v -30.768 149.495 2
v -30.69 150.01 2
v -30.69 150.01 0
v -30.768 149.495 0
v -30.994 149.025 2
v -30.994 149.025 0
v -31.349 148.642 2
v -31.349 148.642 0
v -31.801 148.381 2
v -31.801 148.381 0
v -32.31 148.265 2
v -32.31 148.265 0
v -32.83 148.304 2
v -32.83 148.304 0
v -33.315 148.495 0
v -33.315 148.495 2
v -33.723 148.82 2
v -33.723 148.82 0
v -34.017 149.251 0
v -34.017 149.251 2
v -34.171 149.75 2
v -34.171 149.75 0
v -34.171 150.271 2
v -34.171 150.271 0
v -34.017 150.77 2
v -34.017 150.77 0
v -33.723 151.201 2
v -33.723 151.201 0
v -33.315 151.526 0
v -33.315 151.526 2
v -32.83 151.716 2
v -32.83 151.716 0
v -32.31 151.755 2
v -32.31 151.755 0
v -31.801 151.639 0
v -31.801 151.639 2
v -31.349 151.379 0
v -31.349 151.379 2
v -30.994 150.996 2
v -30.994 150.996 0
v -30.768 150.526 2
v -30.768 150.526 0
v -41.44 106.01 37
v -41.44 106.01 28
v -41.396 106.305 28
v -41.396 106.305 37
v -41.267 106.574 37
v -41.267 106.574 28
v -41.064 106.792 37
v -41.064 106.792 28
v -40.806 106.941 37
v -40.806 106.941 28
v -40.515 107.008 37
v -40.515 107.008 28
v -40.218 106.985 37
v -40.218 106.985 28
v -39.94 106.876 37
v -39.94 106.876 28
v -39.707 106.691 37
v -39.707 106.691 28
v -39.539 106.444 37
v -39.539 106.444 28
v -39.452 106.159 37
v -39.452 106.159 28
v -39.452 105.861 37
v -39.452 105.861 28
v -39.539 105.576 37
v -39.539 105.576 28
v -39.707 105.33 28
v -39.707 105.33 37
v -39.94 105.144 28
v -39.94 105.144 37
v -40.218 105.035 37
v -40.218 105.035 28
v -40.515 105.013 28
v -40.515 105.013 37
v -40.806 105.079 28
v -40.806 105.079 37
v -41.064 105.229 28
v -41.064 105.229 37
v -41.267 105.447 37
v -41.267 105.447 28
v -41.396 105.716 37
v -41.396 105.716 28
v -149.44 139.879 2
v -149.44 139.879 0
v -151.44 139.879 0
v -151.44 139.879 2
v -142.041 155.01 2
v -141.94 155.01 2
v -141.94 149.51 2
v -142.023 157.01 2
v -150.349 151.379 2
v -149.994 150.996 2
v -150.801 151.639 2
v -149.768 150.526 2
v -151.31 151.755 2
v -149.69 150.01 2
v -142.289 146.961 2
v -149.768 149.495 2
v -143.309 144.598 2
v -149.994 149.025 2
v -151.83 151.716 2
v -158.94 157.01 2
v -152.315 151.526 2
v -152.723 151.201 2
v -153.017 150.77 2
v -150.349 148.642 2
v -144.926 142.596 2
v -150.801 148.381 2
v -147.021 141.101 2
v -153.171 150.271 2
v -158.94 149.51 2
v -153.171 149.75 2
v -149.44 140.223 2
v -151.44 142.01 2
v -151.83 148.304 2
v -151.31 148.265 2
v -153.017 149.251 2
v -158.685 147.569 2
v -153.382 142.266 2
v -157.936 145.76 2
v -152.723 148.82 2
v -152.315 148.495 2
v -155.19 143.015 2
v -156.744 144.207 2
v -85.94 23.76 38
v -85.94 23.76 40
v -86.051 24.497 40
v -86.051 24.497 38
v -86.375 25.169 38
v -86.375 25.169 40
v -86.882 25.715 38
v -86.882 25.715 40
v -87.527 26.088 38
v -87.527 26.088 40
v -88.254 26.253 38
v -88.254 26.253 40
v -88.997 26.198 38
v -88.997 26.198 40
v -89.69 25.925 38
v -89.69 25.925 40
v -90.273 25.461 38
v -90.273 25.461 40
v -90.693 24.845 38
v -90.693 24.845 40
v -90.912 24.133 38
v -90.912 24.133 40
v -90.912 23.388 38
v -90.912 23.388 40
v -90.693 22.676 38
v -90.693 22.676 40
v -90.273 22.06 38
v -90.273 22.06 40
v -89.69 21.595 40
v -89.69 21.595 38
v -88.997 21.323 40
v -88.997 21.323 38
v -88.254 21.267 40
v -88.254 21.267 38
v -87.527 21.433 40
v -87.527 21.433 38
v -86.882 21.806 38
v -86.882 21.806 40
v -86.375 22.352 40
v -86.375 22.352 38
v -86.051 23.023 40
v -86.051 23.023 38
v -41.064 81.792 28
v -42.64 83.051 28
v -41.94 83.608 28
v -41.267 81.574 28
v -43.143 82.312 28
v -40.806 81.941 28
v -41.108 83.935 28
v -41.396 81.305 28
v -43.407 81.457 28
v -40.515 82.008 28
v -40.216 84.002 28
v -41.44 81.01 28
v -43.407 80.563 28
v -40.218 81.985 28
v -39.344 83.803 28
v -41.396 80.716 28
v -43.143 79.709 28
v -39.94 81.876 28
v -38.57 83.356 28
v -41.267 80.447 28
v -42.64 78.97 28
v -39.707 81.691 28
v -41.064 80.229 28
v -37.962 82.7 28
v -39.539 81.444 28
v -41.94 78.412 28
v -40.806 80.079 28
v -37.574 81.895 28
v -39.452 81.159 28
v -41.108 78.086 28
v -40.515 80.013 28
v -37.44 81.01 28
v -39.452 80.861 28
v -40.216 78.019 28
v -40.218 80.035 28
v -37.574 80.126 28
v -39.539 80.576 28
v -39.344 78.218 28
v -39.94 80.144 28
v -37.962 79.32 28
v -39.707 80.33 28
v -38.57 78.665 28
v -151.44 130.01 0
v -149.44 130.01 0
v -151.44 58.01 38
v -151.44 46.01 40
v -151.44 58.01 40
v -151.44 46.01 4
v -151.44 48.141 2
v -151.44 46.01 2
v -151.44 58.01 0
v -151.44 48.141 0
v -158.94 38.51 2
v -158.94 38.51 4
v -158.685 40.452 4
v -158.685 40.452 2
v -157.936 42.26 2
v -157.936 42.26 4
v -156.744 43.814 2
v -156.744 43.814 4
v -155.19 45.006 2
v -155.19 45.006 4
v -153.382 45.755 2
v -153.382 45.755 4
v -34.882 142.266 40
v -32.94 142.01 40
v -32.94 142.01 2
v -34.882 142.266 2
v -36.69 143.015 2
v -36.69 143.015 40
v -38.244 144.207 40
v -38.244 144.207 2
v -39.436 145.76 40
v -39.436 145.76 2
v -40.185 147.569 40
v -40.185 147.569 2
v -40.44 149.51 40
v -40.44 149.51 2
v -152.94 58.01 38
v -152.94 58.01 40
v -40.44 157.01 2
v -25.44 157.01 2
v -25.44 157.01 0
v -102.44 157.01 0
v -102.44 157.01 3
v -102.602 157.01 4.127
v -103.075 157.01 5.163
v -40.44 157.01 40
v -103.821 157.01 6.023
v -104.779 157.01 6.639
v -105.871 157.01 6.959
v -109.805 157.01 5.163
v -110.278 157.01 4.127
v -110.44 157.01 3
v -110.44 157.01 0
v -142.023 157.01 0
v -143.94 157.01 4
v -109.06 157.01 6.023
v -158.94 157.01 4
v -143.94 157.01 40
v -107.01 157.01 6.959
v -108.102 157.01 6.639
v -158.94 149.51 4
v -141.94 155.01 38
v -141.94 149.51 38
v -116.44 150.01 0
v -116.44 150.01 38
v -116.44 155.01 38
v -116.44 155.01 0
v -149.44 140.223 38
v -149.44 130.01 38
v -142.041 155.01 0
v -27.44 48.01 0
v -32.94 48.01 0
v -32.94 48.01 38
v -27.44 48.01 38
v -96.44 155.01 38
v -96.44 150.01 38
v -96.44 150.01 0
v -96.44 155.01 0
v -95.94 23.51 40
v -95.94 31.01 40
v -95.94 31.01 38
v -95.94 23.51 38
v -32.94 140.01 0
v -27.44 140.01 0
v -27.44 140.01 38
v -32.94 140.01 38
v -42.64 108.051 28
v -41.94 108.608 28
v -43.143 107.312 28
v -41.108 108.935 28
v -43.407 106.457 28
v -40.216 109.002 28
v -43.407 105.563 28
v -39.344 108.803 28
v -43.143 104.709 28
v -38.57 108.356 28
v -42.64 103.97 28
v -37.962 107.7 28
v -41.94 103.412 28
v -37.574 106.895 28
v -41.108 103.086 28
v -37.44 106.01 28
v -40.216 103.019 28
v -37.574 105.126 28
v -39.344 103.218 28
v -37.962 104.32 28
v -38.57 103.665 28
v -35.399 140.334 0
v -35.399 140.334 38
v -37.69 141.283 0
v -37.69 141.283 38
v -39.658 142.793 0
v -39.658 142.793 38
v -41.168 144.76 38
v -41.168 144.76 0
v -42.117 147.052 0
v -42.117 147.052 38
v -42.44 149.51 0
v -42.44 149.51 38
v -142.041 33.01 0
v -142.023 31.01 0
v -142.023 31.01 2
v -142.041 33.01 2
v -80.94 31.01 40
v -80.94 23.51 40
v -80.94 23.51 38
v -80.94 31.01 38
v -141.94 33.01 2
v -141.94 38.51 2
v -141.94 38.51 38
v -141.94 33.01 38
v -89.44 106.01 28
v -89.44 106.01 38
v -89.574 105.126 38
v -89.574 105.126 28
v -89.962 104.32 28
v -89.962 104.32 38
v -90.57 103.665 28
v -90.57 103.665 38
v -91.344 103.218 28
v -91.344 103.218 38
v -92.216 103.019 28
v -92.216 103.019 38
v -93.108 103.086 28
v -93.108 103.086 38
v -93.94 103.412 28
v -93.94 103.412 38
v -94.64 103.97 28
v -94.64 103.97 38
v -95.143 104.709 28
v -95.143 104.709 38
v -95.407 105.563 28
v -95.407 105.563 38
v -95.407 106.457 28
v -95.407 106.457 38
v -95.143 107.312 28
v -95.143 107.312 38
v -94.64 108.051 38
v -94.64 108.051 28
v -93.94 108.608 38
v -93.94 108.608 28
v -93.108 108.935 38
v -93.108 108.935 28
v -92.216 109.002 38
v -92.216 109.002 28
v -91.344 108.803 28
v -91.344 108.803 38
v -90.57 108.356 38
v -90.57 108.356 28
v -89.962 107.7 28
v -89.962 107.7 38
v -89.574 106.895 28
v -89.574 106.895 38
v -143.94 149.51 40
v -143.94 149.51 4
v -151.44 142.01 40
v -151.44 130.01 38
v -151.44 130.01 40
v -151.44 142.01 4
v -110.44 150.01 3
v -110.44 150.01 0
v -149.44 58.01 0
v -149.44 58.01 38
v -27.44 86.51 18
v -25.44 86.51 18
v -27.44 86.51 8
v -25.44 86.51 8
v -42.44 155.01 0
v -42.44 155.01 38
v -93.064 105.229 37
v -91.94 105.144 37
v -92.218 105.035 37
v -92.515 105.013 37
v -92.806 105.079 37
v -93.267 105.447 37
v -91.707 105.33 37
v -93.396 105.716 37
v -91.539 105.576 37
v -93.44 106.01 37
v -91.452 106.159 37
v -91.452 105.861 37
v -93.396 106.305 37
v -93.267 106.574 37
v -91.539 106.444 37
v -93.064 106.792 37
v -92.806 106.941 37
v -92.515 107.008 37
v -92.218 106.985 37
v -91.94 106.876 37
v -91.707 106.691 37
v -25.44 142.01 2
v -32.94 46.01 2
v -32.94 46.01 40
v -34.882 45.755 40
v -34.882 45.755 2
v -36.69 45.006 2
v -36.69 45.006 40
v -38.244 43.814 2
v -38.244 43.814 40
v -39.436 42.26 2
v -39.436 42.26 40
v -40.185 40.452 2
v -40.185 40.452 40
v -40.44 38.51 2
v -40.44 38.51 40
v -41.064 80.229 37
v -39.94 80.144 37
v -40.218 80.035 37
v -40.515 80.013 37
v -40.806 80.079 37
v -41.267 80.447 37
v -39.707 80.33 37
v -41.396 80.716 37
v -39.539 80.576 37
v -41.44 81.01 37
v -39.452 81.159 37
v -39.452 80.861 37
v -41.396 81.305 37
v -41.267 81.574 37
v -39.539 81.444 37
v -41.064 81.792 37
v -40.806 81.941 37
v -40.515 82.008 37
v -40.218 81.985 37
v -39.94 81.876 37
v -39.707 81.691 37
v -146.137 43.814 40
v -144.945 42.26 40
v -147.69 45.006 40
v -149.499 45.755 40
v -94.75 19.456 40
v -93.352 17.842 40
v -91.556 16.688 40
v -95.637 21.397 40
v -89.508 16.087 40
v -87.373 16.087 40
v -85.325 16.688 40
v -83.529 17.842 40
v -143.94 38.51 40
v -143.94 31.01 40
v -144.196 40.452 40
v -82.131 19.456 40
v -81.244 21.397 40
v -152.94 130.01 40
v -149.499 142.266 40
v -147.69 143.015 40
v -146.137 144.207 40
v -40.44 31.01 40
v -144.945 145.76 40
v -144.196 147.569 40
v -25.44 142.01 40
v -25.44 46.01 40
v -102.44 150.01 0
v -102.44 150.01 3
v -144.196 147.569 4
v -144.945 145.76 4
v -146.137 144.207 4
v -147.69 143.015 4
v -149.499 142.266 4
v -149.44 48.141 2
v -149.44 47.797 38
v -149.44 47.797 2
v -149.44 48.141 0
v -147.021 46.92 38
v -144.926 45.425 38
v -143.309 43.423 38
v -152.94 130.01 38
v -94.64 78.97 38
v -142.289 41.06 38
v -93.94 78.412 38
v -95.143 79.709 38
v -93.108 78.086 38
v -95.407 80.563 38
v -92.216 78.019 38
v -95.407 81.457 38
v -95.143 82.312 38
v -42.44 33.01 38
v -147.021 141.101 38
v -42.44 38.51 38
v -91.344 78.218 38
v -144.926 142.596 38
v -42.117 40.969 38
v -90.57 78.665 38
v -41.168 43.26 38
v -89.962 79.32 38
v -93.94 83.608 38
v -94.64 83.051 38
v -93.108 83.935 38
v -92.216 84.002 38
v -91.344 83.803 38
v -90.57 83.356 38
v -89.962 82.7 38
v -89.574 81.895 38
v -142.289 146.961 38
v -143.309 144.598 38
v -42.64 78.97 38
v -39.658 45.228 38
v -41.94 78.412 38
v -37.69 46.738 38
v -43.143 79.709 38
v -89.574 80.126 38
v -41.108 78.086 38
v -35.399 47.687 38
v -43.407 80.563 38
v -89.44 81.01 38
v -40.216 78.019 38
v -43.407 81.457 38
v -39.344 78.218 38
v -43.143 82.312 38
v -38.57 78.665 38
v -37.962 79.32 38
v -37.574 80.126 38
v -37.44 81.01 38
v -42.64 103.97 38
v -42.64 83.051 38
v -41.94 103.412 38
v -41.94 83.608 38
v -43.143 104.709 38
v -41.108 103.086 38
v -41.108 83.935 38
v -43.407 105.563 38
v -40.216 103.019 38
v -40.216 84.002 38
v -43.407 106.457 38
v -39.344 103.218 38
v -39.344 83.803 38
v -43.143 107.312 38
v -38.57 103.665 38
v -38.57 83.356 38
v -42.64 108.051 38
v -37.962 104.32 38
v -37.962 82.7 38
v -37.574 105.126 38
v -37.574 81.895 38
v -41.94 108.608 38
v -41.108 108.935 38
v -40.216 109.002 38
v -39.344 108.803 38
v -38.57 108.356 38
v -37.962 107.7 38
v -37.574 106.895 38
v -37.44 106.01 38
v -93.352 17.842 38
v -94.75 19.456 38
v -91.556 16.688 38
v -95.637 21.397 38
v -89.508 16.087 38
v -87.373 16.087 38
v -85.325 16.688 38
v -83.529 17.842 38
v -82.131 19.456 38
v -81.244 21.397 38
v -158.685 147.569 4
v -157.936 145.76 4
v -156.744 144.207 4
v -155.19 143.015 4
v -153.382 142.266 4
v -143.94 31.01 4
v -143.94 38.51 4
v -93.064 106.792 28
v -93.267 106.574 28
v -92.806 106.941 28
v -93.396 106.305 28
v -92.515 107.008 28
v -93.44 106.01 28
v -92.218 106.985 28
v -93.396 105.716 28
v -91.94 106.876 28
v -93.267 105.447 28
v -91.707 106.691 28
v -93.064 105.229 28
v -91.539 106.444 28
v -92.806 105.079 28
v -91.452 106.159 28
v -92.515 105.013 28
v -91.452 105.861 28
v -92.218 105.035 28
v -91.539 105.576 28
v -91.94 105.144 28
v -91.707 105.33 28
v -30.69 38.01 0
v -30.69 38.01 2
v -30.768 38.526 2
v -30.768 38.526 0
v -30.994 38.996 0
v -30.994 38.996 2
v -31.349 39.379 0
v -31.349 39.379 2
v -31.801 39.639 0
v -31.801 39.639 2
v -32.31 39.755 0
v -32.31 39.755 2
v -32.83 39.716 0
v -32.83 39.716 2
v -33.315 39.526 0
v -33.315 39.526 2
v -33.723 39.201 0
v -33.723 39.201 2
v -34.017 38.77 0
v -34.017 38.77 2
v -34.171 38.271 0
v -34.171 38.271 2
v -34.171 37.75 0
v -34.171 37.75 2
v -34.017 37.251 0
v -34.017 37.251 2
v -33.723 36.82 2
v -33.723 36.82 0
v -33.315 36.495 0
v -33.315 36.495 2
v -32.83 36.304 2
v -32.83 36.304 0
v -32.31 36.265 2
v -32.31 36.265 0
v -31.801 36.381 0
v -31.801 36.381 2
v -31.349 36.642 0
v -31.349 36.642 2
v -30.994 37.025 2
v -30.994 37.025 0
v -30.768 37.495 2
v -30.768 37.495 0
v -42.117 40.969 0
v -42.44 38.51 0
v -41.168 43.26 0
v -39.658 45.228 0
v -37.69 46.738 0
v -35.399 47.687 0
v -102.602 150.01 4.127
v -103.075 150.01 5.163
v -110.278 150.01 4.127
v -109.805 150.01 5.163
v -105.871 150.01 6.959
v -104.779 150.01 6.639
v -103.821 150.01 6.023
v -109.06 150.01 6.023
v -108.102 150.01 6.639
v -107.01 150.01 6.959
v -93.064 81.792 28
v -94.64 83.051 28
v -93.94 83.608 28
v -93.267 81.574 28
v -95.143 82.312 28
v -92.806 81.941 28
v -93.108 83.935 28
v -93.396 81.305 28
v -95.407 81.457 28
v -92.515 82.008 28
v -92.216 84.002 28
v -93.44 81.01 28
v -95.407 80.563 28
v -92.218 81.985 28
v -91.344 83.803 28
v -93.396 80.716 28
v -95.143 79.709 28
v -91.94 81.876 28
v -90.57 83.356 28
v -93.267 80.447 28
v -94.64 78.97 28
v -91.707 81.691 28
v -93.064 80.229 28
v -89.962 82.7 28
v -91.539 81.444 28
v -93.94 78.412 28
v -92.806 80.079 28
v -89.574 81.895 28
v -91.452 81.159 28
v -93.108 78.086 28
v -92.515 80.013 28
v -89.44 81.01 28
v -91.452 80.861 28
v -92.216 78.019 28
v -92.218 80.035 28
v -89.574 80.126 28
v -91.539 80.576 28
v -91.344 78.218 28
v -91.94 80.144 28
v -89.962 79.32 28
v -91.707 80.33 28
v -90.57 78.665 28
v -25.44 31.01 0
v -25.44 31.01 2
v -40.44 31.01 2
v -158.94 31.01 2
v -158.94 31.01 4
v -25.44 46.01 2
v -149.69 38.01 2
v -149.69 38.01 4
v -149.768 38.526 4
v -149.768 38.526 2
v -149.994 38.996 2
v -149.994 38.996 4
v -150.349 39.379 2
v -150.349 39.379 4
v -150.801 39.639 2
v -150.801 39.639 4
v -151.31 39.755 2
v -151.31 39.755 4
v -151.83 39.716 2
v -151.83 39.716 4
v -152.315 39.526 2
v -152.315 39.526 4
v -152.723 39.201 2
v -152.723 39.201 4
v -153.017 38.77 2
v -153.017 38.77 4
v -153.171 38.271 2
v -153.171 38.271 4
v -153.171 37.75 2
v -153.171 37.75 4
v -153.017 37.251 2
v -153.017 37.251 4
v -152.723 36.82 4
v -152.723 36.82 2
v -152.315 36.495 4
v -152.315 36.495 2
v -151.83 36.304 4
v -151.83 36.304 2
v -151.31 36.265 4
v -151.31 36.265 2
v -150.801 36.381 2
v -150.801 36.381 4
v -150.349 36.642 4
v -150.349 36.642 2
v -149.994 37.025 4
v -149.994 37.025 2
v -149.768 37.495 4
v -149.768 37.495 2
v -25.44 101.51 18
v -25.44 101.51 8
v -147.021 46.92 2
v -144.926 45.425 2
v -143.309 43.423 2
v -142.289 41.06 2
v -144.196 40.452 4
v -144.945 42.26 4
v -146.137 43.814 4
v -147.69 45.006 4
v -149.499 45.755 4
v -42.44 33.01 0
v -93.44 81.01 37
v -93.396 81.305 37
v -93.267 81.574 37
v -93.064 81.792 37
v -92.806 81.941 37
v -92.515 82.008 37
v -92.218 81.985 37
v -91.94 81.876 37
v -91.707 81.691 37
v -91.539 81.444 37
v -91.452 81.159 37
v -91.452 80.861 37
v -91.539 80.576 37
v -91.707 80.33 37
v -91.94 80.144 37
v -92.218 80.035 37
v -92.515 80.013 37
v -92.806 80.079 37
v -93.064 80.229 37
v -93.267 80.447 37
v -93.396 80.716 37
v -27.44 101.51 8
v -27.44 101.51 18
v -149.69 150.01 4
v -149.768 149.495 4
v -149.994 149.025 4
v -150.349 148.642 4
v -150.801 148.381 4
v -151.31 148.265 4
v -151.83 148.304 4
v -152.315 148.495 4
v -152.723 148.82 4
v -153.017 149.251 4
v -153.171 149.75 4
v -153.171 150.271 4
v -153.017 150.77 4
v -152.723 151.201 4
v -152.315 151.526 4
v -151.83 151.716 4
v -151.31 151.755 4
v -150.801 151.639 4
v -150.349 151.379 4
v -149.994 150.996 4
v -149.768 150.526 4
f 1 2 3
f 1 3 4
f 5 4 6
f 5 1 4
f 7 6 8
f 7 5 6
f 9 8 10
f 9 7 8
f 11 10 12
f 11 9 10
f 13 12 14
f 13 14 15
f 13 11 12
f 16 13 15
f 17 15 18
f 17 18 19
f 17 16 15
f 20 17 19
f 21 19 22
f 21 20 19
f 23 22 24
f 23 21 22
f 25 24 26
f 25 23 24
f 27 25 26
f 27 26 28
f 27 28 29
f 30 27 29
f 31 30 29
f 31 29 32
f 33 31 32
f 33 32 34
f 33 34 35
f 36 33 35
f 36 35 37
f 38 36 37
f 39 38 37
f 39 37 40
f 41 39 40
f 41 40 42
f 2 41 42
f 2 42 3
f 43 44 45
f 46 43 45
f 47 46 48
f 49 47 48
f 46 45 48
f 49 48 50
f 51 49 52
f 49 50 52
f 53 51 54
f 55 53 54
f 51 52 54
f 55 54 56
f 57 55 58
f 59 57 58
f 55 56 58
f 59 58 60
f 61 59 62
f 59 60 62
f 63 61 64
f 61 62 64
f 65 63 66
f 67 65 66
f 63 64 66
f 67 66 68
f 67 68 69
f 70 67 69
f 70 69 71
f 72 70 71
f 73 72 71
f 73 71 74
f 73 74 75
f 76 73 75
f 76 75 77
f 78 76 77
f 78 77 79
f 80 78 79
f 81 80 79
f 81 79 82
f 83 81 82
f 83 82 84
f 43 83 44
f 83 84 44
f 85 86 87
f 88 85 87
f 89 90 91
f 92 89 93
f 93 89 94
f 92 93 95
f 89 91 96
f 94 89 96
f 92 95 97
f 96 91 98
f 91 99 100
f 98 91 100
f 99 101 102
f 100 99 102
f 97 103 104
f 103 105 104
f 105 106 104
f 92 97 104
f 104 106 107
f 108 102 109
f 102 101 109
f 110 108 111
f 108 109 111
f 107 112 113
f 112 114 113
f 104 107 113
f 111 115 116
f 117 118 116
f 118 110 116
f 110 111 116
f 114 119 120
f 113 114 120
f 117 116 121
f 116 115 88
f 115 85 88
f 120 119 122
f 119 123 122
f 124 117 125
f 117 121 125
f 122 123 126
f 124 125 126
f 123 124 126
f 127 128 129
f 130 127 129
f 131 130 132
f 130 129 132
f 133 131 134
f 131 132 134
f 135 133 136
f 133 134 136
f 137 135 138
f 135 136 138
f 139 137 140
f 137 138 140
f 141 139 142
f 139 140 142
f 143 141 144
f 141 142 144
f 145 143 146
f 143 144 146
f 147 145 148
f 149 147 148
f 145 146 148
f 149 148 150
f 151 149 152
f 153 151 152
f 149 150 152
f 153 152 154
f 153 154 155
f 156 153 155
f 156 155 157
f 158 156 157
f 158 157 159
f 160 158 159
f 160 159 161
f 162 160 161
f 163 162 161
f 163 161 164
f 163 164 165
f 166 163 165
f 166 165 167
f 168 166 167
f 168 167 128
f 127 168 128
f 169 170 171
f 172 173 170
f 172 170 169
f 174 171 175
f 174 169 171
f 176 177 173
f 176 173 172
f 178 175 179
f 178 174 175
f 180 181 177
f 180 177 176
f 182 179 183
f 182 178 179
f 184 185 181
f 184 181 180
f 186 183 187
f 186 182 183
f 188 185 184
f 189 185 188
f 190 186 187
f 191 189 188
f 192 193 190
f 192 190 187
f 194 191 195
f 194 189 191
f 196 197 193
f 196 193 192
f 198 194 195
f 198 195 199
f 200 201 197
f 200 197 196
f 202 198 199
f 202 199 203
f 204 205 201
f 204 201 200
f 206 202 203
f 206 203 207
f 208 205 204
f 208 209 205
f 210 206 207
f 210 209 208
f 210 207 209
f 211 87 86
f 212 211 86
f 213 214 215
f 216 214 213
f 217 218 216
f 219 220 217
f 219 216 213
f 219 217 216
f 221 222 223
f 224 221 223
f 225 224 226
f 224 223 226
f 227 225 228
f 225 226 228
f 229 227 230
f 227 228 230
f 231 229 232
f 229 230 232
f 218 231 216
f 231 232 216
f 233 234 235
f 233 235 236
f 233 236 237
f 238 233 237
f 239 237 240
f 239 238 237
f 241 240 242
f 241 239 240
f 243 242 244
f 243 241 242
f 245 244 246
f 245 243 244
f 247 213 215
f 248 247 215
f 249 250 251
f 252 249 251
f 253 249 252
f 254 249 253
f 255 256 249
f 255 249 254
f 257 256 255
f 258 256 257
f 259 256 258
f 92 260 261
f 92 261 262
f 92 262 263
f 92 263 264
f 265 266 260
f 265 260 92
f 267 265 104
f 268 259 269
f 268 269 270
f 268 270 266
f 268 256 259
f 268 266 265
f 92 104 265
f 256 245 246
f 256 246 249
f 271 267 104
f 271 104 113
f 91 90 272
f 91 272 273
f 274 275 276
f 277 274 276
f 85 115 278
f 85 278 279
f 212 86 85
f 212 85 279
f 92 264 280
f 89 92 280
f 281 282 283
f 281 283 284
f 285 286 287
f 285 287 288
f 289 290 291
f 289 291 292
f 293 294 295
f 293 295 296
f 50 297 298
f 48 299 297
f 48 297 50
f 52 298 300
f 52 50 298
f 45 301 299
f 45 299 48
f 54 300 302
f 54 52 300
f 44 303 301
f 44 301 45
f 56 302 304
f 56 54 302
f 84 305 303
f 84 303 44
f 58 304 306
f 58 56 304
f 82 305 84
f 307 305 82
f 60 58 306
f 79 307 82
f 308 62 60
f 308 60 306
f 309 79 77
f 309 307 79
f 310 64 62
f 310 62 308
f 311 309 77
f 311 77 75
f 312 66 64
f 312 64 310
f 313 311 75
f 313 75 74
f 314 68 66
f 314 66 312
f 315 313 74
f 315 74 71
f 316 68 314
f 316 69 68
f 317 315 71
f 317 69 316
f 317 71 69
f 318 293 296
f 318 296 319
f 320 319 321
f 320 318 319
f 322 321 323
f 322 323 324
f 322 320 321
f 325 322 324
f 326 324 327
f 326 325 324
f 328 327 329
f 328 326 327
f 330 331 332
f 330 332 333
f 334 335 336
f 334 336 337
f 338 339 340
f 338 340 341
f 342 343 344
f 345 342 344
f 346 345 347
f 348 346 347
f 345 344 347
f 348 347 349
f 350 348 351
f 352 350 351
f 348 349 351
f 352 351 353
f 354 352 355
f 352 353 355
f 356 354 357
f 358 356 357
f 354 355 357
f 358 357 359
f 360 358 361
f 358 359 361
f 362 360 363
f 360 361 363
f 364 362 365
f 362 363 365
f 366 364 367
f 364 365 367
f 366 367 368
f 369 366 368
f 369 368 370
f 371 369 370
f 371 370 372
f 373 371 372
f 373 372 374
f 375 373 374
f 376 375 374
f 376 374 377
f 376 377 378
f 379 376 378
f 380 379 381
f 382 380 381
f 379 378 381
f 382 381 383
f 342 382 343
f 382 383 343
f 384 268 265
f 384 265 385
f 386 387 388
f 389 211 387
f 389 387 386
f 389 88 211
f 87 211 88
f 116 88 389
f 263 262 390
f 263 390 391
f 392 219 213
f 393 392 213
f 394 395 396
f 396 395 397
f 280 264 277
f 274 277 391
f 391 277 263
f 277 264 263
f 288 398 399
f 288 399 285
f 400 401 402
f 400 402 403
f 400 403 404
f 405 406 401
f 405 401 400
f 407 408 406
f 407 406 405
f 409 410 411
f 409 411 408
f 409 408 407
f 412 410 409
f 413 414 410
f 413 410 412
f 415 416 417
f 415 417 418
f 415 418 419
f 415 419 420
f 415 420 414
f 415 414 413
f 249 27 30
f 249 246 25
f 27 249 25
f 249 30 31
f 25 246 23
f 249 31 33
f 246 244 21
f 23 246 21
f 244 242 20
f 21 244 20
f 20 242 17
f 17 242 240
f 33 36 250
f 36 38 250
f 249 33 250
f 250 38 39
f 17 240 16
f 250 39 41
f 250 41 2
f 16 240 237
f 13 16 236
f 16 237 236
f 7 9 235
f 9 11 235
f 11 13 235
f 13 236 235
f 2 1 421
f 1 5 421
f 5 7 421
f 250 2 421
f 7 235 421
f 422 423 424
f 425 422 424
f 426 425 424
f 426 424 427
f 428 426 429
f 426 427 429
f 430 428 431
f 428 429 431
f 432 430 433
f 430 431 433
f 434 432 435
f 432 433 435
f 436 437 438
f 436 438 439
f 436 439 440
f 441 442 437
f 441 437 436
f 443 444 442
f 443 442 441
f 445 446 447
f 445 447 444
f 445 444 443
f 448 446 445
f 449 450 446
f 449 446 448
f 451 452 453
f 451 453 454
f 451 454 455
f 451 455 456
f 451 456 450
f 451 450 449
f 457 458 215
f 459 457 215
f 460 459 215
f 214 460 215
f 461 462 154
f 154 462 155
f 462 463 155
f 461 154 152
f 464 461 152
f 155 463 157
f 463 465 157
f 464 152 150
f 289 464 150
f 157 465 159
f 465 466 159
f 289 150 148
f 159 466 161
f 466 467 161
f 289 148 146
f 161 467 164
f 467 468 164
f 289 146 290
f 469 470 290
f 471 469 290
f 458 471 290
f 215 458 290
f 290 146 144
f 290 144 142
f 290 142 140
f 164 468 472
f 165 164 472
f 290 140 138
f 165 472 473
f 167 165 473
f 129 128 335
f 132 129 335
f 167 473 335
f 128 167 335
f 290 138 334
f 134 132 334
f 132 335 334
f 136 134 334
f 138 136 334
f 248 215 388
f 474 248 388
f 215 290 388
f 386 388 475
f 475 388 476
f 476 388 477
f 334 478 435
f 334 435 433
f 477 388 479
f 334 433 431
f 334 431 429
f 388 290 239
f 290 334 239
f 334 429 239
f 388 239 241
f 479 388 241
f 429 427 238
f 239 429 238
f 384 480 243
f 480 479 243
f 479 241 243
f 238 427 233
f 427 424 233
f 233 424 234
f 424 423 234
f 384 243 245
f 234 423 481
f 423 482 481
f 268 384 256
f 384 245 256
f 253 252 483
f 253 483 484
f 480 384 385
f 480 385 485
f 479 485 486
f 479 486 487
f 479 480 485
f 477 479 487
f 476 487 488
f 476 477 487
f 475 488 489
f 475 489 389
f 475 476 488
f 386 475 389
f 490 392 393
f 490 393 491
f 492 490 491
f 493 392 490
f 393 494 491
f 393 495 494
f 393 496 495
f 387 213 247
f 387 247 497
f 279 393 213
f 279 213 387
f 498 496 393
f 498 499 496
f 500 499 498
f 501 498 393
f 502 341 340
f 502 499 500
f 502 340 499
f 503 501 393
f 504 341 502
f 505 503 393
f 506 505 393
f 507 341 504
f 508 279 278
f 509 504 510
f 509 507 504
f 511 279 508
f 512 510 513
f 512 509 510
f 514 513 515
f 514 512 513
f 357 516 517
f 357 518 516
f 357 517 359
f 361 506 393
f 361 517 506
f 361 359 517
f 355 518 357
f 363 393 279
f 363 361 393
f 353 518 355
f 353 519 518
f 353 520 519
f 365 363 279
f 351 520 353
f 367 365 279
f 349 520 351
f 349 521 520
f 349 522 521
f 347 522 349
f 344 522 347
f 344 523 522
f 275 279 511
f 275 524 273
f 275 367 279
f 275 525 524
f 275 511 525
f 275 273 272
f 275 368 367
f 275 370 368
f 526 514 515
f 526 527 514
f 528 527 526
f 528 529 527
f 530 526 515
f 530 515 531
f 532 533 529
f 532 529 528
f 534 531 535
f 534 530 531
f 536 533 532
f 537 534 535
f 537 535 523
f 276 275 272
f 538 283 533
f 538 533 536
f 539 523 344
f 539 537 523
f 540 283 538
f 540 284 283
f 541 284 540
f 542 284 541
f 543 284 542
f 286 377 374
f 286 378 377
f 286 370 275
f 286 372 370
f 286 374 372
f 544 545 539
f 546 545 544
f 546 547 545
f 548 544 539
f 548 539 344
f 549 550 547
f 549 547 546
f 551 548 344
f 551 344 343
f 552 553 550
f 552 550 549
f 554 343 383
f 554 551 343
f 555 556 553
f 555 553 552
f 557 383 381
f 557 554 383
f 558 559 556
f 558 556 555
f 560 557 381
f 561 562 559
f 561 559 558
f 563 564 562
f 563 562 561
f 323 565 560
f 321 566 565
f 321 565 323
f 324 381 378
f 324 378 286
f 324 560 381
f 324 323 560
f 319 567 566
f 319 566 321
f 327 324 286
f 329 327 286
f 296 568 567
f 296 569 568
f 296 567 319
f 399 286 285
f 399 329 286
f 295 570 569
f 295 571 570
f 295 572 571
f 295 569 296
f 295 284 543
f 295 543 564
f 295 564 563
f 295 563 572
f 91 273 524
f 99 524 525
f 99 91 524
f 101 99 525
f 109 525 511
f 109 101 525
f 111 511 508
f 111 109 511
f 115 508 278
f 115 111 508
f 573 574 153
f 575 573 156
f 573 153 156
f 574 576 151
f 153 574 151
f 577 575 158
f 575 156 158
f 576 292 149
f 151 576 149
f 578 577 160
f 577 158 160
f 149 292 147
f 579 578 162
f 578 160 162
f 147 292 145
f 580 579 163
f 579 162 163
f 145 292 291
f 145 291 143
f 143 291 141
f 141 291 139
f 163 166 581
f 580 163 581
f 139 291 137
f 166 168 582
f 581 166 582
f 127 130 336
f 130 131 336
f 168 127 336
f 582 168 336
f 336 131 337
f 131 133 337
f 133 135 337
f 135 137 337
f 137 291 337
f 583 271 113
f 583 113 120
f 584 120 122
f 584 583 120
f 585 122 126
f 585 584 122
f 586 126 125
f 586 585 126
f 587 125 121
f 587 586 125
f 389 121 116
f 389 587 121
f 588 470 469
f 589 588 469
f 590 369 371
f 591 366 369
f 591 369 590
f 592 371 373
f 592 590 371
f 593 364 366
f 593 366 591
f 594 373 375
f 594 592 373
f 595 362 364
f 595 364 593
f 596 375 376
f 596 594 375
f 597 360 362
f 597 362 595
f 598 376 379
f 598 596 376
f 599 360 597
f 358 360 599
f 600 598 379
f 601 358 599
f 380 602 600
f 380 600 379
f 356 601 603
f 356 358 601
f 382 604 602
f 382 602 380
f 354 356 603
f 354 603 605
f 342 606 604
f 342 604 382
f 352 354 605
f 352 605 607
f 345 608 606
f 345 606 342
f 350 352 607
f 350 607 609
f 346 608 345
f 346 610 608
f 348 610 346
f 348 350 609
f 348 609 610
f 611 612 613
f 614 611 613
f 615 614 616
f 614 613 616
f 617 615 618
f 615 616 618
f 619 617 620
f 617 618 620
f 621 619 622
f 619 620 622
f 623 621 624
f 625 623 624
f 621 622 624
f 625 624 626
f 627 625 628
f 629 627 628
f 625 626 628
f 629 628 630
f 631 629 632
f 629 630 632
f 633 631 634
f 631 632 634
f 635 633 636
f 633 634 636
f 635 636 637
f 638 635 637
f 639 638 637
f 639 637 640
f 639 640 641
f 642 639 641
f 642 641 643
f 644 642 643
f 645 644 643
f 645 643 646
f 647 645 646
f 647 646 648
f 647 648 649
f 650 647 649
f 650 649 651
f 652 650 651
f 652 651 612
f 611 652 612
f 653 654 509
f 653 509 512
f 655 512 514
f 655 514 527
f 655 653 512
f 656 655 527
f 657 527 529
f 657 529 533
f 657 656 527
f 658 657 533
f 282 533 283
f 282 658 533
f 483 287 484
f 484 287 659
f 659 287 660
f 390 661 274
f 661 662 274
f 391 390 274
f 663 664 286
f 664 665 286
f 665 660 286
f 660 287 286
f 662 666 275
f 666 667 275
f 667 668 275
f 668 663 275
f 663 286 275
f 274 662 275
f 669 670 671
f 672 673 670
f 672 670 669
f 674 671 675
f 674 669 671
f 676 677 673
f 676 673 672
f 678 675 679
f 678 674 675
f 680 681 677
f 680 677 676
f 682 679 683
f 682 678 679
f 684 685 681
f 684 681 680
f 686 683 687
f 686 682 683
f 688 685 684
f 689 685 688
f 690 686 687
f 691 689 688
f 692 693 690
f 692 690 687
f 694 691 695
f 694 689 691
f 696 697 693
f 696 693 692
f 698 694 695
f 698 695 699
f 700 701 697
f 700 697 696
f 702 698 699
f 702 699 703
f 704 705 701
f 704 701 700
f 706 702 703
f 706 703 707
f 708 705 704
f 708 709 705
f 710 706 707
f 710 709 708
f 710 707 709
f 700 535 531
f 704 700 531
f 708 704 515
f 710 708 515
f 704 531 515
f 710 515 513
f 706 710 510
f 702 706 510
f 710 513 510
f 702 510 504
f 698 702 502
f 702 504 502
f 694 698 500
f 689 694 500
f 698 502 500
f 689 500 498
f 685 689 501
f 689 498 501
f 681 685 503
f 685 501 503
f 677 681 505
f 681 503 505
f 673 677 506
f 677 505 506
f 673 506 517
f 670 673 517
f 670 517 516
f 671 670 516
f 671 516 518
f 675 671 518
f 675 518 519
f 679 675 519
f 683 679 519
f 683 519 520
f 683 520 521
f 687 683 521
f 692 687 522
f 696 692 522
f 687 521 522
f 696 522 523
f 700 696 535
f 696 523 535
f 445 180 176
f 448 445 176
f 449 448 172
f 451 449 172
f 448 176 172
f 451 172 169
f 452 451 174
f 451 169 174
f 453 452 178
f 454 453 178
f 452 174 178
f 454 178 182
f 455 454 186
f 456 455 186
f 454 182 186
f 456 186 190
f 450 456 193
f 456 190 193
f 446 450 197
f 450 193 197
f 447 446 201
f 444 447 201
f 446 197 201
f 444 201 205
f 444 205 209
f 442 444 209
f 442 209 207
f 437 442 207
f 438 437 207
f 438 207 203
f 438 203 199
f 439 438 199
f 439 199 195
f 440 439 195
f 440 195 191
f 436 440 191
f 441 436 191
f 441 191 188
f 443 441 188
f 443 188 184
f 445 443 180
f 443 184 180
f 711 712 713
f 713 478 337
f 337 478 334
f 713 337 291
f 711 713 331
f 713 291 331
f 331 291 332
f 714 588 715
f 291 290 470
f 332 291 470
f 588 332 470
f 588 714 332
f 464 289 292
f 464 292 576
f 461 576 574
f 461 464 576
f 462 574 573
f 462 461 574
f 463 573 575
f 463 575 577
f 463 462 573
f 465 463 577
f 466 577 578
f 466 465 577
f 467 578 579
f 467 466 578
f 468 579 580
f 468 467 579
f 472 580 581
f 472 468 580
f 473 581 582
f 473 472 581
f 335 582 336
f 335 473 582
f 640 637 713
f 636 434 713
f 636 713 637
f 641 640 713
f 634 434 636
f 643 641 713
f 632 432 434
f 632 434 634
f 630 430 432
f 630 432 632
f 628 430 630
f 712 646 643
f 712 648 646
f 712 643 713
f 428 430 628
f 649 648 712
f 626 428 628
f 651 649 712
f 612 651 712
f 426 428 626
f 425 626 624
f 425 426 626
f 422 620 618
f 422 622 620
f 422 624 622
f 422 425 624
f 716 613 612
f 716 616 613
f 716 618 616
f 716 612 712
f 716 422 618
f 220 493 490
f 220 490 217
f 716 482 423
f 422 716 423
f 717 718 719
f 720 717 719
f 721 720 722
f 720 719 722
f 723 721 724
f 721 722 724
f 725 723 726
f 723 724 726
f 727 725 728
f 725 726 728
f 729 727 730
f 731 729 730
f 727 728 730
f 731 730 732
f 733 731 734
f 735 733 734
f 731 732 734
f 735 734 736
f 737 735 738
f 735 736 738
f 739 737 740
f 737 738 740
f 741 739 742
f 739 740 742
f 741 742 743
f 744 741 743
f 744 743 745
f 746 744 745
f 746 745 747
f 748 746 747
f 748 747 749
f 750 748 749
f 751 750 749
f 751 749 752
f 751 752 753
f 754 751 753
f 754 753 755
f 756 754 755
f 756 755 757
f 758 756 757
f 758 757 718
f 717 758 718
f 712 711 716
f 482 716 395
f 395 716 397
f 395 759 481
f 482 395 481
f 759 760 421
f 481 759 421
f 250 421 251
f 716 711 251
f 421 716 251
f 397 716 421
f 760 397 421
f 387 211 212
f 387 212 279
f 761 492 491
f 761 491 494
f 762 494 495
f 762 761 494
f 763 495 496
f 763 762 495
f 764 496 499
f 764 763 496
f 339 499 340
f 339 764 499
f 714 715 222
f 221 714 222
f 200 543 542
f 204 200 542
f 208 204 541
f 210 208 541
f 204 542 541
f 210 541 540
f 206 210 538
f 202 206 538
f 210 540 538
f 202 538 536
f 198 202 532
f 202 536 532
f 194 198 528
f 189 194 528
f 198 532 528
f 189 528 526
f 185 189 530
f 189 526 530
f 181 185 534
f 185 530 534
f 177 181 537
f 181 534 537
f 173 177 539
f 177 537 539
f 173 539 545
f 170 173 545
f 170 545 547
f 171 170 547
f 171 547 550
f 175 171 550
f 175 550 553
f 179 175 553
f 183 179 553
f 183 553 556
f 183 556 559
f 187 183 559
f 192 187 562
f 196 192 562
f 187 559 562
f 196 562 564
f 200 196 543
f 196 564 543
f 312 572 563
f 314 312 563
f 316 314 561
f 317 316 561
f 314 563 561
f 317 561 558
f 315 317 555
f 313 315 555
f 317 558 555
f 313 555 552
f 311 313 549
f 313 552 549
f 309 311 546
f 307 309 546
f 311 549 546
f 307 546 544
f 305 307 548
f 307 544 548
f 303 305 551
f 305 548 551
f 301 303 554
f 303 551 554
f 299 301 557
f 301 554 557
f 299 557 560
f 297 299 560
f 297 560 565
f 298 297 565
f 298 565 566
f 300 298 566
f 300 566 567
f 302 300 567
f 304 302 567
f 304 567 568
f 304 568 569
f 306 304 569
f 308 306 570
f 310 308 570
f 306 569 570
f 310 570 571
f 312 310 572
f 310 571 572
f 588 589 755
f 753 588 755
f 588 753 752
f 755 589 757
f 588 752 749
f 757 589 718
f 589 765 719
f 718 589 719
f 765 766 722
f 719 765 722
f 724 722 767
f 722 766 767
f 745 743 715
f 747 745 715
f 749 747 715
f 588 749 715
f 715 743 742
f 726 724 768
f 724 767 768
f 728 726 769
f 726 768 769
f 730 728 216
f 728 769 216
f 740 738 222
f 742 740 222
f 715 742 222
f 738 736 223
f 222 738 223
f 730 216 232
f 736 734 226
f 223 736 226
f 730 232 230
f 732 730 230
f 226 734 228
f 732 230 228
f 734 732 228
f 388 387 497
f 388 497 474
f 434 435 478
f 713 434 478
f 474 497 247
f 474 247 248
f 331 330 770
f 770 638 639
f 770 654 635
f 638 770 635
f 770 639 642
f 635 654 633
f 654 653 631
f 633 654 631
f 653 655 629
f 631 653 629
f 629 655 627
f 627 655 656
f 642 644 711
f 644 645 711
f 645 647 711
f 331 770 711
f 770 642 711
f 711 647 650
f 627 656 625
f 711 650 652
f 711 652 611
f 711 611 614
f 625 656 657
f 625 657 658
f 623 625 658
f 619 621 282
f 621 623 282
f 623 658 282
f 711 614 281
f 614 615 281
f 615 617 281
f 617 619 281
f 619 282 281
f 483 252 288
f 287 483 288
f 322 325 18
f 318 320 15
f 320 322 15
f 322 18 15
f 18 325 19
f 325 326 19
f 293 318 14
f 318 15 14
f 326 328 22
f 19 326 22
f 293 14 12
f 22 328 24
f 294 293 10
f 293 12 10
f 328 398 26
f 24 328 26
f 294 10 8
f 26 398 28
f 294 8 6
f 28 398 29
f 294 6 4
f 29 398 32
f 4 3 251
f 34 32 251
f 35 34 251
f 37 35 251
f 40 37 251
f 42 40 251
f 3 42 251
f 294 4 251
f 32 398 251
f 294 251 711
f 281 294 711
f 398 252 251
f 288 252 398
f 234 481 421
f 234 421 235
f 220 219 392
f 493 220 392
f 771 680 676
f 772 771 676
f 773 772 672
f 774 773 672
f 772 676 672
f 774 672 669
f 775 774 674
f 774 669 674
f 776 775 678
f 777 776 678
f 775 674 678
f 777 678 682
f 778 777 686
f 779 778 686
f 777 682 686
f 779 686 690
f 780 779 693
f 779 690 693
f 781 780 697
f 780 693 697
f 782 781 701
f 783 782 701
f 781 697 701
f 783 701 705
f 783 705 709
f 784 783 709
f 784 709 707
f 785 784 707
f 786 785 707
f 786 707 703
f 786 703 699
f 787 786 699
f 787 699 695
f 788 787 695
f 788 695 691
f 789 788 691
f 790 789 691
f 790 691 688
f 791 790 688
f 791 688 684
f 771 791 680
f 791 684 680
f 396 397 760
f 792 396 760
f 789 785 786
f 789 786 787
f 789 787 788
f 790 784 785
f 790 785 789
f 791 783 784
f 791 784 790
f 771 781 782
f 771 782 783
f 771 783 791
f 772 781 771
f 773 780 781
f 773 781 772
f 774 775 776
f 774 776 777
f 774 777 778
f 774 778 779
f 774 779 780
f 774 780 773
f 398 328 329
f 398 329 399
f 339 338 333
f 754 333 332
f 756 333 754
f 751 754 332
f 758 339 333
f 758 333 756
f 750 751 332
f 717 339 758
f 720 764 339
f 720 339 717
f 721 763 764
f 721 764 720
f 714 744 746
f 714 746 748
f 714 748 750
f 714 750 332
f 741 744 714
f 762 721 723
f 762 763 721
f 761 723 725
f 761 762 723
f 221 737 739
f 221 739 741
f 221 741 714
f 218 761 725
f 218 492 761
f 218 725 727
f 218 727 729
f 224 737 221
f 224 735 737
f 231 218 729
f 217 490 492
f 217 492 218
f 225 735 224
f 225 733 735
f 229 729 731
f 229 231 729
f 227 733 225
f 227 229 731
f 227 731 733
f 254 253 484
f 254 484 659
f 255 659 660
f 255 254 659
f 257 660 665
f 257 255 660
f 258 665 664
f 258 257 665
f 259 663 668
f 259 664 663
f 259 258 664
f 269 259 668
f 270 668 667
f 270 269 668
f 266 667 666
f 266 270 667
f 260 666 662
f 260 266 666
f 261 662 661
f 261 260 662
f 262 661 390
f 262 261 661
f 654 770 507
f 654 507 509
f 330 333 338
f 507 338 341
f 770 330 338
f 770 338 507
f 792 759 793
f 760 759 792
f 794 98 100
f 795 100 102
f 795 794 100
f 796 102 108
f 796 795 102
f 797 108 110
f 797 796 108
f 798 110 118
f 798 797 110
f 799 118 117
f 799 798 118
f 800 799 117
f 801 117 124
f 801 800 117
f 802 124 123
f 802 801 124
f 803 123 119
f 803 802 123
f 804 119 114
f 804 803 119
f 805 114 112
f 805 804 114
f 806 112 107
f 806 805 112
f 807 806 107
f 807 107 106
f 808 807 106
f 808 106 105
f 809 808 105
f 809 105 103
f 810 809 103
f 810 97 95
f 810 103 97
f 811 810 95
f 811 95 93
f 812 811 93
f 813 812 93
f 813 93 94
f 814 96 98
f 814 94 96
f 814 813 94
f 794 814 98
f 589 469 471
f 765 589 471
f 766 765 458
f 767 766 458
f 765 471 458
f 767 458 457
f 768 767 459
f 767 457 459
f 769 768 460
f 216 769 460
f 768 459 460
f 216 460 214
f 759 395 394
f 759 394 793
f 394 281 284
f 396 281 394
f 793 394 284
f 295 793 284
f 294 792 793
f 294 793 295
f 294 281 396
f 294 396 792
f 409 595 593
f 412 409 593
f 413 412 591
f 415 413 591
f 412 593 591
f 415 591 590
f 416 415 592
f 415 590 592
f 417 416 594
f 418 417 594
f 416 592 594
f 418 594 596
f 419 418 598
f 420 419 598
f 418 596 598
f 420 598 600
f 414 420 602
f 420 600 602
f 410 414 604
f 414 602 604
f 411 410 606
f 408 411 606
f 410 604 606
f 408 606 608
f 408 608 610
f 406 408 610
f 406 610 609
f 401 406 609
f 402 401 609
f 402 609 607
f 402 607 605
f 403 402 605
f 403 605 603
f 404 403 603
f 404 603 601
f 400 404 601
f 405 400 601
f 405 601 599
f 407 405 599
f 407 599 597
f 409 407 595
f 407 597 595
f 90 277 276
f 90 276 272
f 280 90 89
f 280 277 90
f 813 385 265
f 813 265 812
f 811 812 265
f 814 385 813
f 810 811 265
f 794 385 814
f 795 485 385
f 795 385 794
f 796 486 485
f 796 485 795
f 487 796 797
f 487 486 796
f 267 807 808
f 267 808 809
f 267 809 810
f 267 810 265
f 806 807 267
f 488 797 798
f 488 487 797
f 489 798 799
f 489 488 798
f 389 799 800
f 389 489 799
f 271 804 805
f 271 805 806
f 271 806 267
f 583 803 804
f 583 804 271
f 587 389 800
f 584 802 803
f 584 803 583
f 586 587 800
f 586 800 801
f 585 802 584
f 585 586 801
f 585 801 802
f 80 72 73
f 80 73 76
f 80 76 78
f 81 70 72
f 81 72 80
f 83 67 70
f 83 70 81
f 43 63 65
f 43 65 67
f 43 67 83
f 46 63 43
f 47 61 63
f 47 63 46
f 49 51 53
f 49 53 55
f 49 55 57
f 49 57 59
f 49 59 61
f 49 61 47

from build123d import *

# Parameters (mm, degrees)
ESQUISSE1_W                          = 126
ESQUISSE1_H                          = 126
BOSS_EXTRU_1_DEPTH                   = 40
ENL_V_MAT_EXTRU_1_DEPTH              = 38
ENL_V_MAT_EXTRU_2_REACH              = 223.428
ESQUISSE4_R                          = 1.75
ENL_V_MAT_EXTRU_5_DEPTH              = 36
COQUE1_DEPTH                         = 38
COQUE1_2_DEPTH                       = 2
BOSS_EXTRU_3_DEPTH                   = 2
ENL_V_MAT_EXTRU_6_REACH              = 228.297
ESQUISSE13_R                         = 1.75
ENL_V_MAT_EXTRU_14_DEPTH             = 2
ESQUISSE16_W                         = 40
ESQUISSE16_H                         = 72
ENL_V_MAT_EXTRU_9_DEPTH              = 2
BOSS_EXTRU_5_DEPTH                   = 2
ENL_V_MAT_EXTRU_11_REACH             = 228.968
ESQUISSE21_R                         = 2.5
ESQUISSE23_R                         = 3
BOSS_EXTRU_7_DEPTH                   = 10
ESQUISSE24_R                         = 1
ENL_V_MAT_EXTRU_12_DEPTH             = 9
R_P_TITION_LIN_AIRE1_COUNT           = 2
R_P_TITION_LIN_AIRE1_PITCH           = 25
R_P_TITION_LIN_AIRE2_COUNT           = 2
R_P_TITION_LIN_AIRE2_PITCH           = 52
R_P_TITION_LIN_AIRE2_COPY_1_SKETCH_R = 3
R_P_TITION_LIN_AIRE2_COPY_1_DEPTH    = 10
R_P_TITION_LIN_AIRE2_COPY_2_SKETCH_R = 1
R_P_TITION_LIN_AIRE2_COPY_2_DEPTH    = 9
ENL_V_MAT_EXTRU_13_REACH             = 211.939
ESQUISSE25_W                         = 10
ESQUISSE25_H                         = 15
ESQUISSE28_W                         = 2
ESQUISSE28_H                         = 72
BOSS_EXTRU_8_DEPTH                   = 3.5
ESQUISSE30_W                         = 20
ESQUISSE30_H                         = 5
BOSS_EXTRU_9_DEPTH                   = 38
ENL_V_MAT_EXTRU_15_REACH             = 218.201


# Read off the part's stored shape, not the designer's step: Coque1
with BuildPart() as part:
    # Esquisse1 → Boss.-Extru.1 (new body)
    with BuildSketch(Plane.XY):
        with Locations((-88.440384558, 94.010362694)):
            Rectangle(ESQUISSE1_W, ESQUISSE1_H)
    extrude(amount=BOSS_EXTRU_1_DEPTH)

    # Esquisse2 → Enlèv. mat.-Extru.1 (cut)
    with BuildSketch(Plane.XY.offset(40)):
        with BuildLine():
            Line((-40.440384558, 31.010362694), (-25.440384558, 31.010362694))
            Line((-25.440384558, 31.010362694), (-25.440384558, 46.010362694))
            Line((-25.440384558, 46.010362694), (-32.940384558, 46.010362694))
            ThreePointArc((-32.940384558, 46.010362694), (-38.243685417, 43.813663553), (-40.440384558, 38.510362694))
            Line((-40.440384558, 38.510362694), (-40.440384558, 31.010362694))
        make_face()
    enl_v_mat_extru_1 = extrude(amount=-ENL_V_MAT_EXTRU_1_DEPTH, mode=Mode.SUBTRACT)

    # Esquisse4 → Enlèv. mat.-Extru.2 (cut, up to next)
    with BuildSketch(Plane.XY.offset(2), mode=Mode.PRIVATE) as enl_v_mat_extru_2_sk1:
        with Locations((-32.440384558, 38.010362694)):
            Circle(ESQUISSE4_R)
    enl_v_mat_extru_2_tool1 = extrude(enl_v_mat_extru_2_sk1.sketch, amount=-ENL_V_MAT_EXTRU_2_REACH, mode=Mode.PRIVATE) & part.part
    enl_v_mat_extru_2 = enl_v_mat_extru_2_tool1.solids().sort_by_distance((-32.440385, 38.010363, 2))[0]
    add(enl_v_mat_extru_2, mode=Mode.SUBTRACT)

    # Symétrie1: Enlèv. mat.-Extru.1, Enlèv. mat.-Extru.2 across plane
    add(enl_v_mat_extru_1.mirror(Plane(origin=(0, 94.010362694, 0), x_dir=(0, 0, 1), z_dir=(0, -1, 0))), mode=Mode.SUBTRACT)
    add(enl_v_mat_extru_2.mirror(Plane(origin=(0, 94.010362694, 0), x_dir=(0, 0, 1), z_dir=(0, -1, 0))), mode=Mode.SUBTRACT)

    # Esquisse10 → Enlèv. mat.-Extru.5 (cut)
    with BuildSketch(Plane.XY.offset(40)):
        with BuildLine():
            Line((-151.440384558, 46.010362694), (-151.440384558, 31.010362694))
            Line((-151.440384558, 31.010362694), (-143.940384558, 31.010362694))
            Line((-143.940384558, 31.010362694), (-143.940384558, 38.510362694))
            ThreePointArc((-143.940384558, 38.510362694), (-146.137083699, 43.813663553), (-151.440384558, 46.010362694))
        make_face()
    enl_v_mat_extru_5 = extrude(amount=-ENL_V_MAT_EXTRU_5_DEPTH, mode=Mode.SUBTRACT)

    # Symétrie3: Enlèv. mat.-Extru.5 across plane
    add(enl_v_mat_extru_5.mirror(Plane(origin=(0, 94.010362694, 0), x_dir=(0, 0, 1), z_dir=(0, -1, 0))), mode=Mode.SUBTRACT)

    # Coque1 outline → Coque1 (cut)
    with BuildSketch(Plane.XY):
        with BuildLine():
            Line((-42.440384558, 155.010362694), (-141.940384558, 155.010362694))
            Line((-141.940384558, 155.010362694), (-141.940384558, 149.510362694))
            ThreePointArc((-141.940384558, 149.510362694), (-144.049511808, 143.541694501), (-149.440384558, 140.223274884))
            Line((-149.440384558, 140.223274884), (-149.440384558, 47.797450505))
            ThreePointArc((-149.440384558, 47.797450505), (-144.049511808, 44.479030887), (-141.940384558, 38.510362694))
            Line((-141.940384558, 38.510362694), (-141.940384558, 33.010362694))
            Line((-141.940384558, 33.010362694), (-42.440384558, 33.010362694))
            Line((-42.440384558, 33.010362694), (-42.440384558, 38.510362694))
            ThreePointArc((-42.440384558, 38.510362694), (-39.657898979, 45.227877116), (-32.940384558, 48.010362694))
            Line((-32.940384558, 48.010362694), (-27.440384558, 48.010362694))
            Line((-27.440384558, 48.010362694), (-27.440384558, 140.010362694))
            Line((-27.440384558, 140.010362694), (-32.940384558, 140.010362694))
            ThreePointArc((-32.940384558, 140.010362694), (-39.657898979, 142.792848273), (-42.440384558, 149.510362694))
            Line((-42.440384558, 149.510362694), (-42.440384558, 155.010362694))
        make_face()
    extrude(amount=COQUE1_DEPTH, mode=Mode.SUBTRACT)

    # Coque1 2 outline → Coque1 2 (cut)
    with BuildSketch(Plane.XY):
        with BuildLine():
            Line((-141.940384558, 155.010362694), (-149.440384558, 155.010362694))
            Line((-149.440384558, 155.010362694), (-149.440384558, 140.223274884))
            ThreePointArc((-149.440384558, 140.223274884), (-144.049511808, 143.541694501), (-141.940384558, 149.510362694))
            Line((-141.940384558, 149.510362694), (-141.940384558, 155.010362694))
        make_face()
        with BuildLine():
            ThreePointArc((-141.940384558, 38.510362694), (-144.049511808, 44.479030887), (-149.440384558, 47.797450505))
            Line((-149.440384558, 47.797450505), (-149.440384558, 33.010362694))
            Line((-149.440384558, 33.010362694), (-141.940384558, 33.010362694))
            Line((-141.940384558, 33.010362694), (-141.940384558, 38.510362694))
        make_face()
    extrude(amount=COQUE1_2_DEPTH, mode=Mode.SUBTRACT)

    # Esquisse12 → Boss.-Extru.3 (add)
    with BuildSketch(Plane.XY.offset(4)):
        with BuildLine():
            Line((-158.940384558, 31.010362694), (-158.940384558, 38.510362694))
            ThreePointArc((-158.940384558, 38.510362694), (-156.743685417, 43.813663553), (-151.440384558, 46.010362694))
            Line((-151.440384558, 46.010362694), (-151.440384558, 31.010362694))
            Line((-151.440384558, 31.010362694), (-158.940384558, 31.010362694))
        make_face()
    boss_extru_3 = extrude(amount=-BOSS_EXTRU_3_DEPTH)

    # Esquisse13 → Enlèv. mat.-Extru.6 (cut, up to next)
    with BuildSketch(Plane.XY.offset(4), mode=Mode.PRIVATE) as enl_v_mat_extru_6_sk1:
        with Locations((-151.440384558, 38.010362694)):
            Circle(ESQUISSE13_R)
    enl_v_mat_extru_6_tool1 = extrude(enl_v_mat_extru_6_sk1.sketch, amount=-ENL_V_MAT_EXTRU_6_REACH, mode=Mode.PRIVATE) & part.part
    enl_v_mat_extru_6 = enl_v_mat_extru_6_tool1.solids().sort_by_distance((-151.440385, 38.010363, 4))[0]
    add(enl_v_mat_extru_6, mode=Mode.SUBTRACT)

    # Esquisse27 → Enlèv. mat.-Extru.14 (cut)
    with BuildSketch(Plane(origin=(0, 0, 0), x_dir=(-1, 0, 0), z_dir=(0, 0, -1))):
        Polygon((149.440384558, 33.010362694), (149.440384558, 48.141426507), (151.440384558, 48.141426507), (151.440384558, 31.010362694), (142.02307923, 31.010362694), (142.041179779, 33.010362694), align=None)
    enl_v_mat_extru_14 = extrude(amount=-ENL_V_MAT_EXTRU_14_DEPTH, mode=Mode.SUBTRACT)

    # Symétrie5: Boss.-Extru.3, Enlèv. mat.-Extru.6, Enlèv. mat.-Extru.14 across plane
    add(boss_extru_3.mirror(Plane(origin=(0, 94.010362694, 0), x_dir=(0, 0, 1), z_dir=(0, -1, 0))))
    add(enl_v_mat_extru_6.mirror(Plane(origin=(0, 94.010362694, 0), x_dir=(0, 0, 1), z_dir=(0, -1, 0))), mode=Mode.SUBTRACT)
    add(enl_v_mat_extru_14.mirror(Plane(origin=(0, 94.010362694, 0), x_dir=(0, 0, 1), z_dir=(0, -1, 0))), mode=Mode.SUBTRACT)

    # Esquisse16 → Enlèv. mat.-Extru.9 (cut)
    with BuildSketch(Plane.ZY.offset(151.440384558)):
        with Locations((20, 94.010362694)):
            Rectangle(ESQUISSE16_W, ESQUISSE16_H)
    extrude(amount=-ENL_V_MAT_EXTRU_9_DEPTH, mode=Mode.SUBTRACT)

    # Esquisse20 → Boss.-Extru.5 (add)
    with BuildSketch(Plane.XY.offset(40)):
        with BuildLine():
            Line((-80.940384558, 31.010362694), (-95.940384558, 31.010362694))
            Line((-95.940384558, 31.010362694), (-95.940384558, 23.510362694))
            ThreePointArc((-95.940384558, 23.510362694), (-88.440384558, 16.010362694), (-80.940384558, 23.510362694))
            Line((-80.940384558, 23.510362694), (-80.940384558, 31.010362694))
        make_face()
    extrude(amount=-BOSS_EXTRU_5_DEPTH)

    # Esquisse21 → Enlèv. mat.-Extru.11 (cut, up to next)
    with BuildSketch(Plane.XY.offset(40), mode=Mode.PRIVATE) as enl_v_mat_extru_11_sk1:
        with Locations((-88.440384558, 23.760362694)):
            Circle(ESQUISSE21_R)
    enl_v_mat_extru_11_tool1 = extrude(enl_v_mat_extru_11_sk1.sketch, amount=-ENL_V_MAT_EXTRU_11_REACH, mode=Mode.PRIVATE) & part.part
    add(enl_v_mat_extru_11_tool1.solids().sort_by_distance((-88.440385, 23.760363, 40))[0], mode=Mode.SUBTRACT)

    # Esquisse23 → Boss.-Extru.7 (add)
    with BuildSketch(Plane(origin=(0, 0, 38), x_dir=(-1, 0, 0), z_dir=(0, 0, -1))):
        with Locations(Location((40.440384558, 81.010362694, 0), (0, 0, 180))):
            Circle(ESQUISSE23_R)
    boss_extru_7 = extrude(amount=BOSS_EXTRU_7_DEPTH)

    # Esquisse24 → Enlèv. mat.-Extru.12 (cut)
    with BuildSketch(Plane(origin=(0, 0, 28), x_dir=(-1, 0, 0), z_dir=(0, 0, -1))):
        with Locations((40.440384558, 81.010362694)):
            Circle(ESQUISSE24_R)
    enl_v_mat_extru_12 = extrude(amount=-ENL_V_MAT_EXTRU_12_DEPTH, mode=Mode.SUBTRACT)

    # Répétition linéaire1: Boss.-Extru.7, Enlèv. mat.-Extru.12 ×2
    with Locations(*[(0, i * R_P_TITION_LIN_AIRE1_PITCH, 0) for i in range(1, R_P_TITION_LIN_AIRE1_COUNT)]):
        add(boss_extru_7)
        add(enl_v_mat_extru_12, mode=Mode.SUBTRACT)

    # Répétition linéaire2: Boss.-Extru.7, Enlèv. mat.-Extru.12 ×2
    with Locations(*[(-i * R_P_TITION_LIN_AIRE2_PITCH, 0, 0) for i in range(1, R_P_TITION_LIN_AIRE2_COUNT)]):
        add(boss_extru_7)
        add(enl_v_mat_extru_12, mode=Mode.SUBTRACT)

    # Répétition linéaire2 copy 1 sketch → Répétition linéaire2 copy 1 (add)
    with BuildSketch(Plane(origin=(-52, 25, 38), x_dir=(-1, 0, 0), z_dir=(0, 0, -1))):
        with Locations(Location((40.440384558, 81.010362694, 0), (0, 0, 180))):
            Circle(R_P_TITION_LIN_AIRE2_COPY_1_SKETCH_R)
    extrude(amount=R_P_TITION_LIN_AIRE2_COPY_1_DEPTH)

    # Répétition linéaire2 copy 2 sketch → Répétition linéaire2 copy 2 (cut)
    with BuildSketch(Plane(origin=(-52, 25, 28), x_dir=(-1, 0, 0), z_dir=(0, 0, -1))):
        with Locations((40.440384558, 81.010362694)):
            Circle(R_P_TITION_LIN_AIRE2_COPY_2_SKETCH_R)
    extrude(amount=-R_P_TITION_LIN_AIRE2_COPY_2_DEPTH, mode=Mode.SUBTRACT)

    # Esquisse25 → Enlèv. mat.-Extru.13 (cut, up to next)
    with BuildSketch(Plane(origin=(-25.440384558, 0, 0), x_dir=(0, 0, -1), z_dir=(1, 0, 0)), mode=Mode.PRIVATE) as enl_v_mat_extru_13_sk1:
        with Locations((-13, 94.010362694)):
            Rectangle(ESQUISSE25_W, ESQUISSE25_H)
    enl_v_mat_extru_13_tool1 = extrude(enl_v_mat_extru_13_sk1.sketch, amount=-ENL_V_MAT_EXTRU_13_REACH, mode=Mode.PRIVATE) & part.part
    add(enl_v_mat_extru_13_tool1.solids().sort_by_distance((-25.440385, 94.010363, 13))[0], mode=Mode.SUBTRACT)

    # Esquisse28 → Boss.-Extru.8 (add)
    with BuildSketch(Plane.ZY.offset(149.440384558)):
        with Locations((39, 94.010362694)):
            Rectangle(ESQUISSE28_W, ESQUISSE28_H)
    extrude(amount=BOSS_EXTRU_8_DEPTH)

    # Esquisse30 → Boss.-Extru.9 (add)
    with BuildSketch(Plane(origin=(0, 0, 38), x_dir=(-1, 0, 0), z_dir=(0, 0, -1))):
        with Locations((106.440384558, 152.510362694)):
            Rectangle(ESQUISSE30_W, ESQUISSE30_H)
    extrude(amount=BOSS_EXTRU_9_DEPTH)

    # Esquisse29 → Enlèv. mat.-Extru.15 (cut, up to next)
    with BuildSketch(Plane(origin=(0, 157.010362694, 0), x_dir=(1, 0, 0), z_dir=(0, 1, 0)), mode=Mode.PRIVATE) as enl_v_mat_extru_15_sk1:
        with BuildLine():
            Line((-110.440384558, -3), (-110.440384558, 0))
            Line((-110.440384558, 0), (-102.440384558, 0))
            Line((-102.440384558, 0), (-102.440384558, -3))
            ThreePointArc((-102.440384558, -3), (-106.440384558, -7), (-110.440384558, -3))
        make_face()
    enl_v_mat_extru_15_tool1 = extrude(enl_v_mat_extru_15_sk1.sketch, amount=-ENL_V_MAT_EXTRU_15_REACH, mode=Mode.PRIVATE) & part.part
    add(enl_v_mat_extru_15_tool1.solids().sort_by_distance((-106.440385, 157.010363, 3.135687))[0], mode=Mode.SUBTRACT)


solid = part.part
